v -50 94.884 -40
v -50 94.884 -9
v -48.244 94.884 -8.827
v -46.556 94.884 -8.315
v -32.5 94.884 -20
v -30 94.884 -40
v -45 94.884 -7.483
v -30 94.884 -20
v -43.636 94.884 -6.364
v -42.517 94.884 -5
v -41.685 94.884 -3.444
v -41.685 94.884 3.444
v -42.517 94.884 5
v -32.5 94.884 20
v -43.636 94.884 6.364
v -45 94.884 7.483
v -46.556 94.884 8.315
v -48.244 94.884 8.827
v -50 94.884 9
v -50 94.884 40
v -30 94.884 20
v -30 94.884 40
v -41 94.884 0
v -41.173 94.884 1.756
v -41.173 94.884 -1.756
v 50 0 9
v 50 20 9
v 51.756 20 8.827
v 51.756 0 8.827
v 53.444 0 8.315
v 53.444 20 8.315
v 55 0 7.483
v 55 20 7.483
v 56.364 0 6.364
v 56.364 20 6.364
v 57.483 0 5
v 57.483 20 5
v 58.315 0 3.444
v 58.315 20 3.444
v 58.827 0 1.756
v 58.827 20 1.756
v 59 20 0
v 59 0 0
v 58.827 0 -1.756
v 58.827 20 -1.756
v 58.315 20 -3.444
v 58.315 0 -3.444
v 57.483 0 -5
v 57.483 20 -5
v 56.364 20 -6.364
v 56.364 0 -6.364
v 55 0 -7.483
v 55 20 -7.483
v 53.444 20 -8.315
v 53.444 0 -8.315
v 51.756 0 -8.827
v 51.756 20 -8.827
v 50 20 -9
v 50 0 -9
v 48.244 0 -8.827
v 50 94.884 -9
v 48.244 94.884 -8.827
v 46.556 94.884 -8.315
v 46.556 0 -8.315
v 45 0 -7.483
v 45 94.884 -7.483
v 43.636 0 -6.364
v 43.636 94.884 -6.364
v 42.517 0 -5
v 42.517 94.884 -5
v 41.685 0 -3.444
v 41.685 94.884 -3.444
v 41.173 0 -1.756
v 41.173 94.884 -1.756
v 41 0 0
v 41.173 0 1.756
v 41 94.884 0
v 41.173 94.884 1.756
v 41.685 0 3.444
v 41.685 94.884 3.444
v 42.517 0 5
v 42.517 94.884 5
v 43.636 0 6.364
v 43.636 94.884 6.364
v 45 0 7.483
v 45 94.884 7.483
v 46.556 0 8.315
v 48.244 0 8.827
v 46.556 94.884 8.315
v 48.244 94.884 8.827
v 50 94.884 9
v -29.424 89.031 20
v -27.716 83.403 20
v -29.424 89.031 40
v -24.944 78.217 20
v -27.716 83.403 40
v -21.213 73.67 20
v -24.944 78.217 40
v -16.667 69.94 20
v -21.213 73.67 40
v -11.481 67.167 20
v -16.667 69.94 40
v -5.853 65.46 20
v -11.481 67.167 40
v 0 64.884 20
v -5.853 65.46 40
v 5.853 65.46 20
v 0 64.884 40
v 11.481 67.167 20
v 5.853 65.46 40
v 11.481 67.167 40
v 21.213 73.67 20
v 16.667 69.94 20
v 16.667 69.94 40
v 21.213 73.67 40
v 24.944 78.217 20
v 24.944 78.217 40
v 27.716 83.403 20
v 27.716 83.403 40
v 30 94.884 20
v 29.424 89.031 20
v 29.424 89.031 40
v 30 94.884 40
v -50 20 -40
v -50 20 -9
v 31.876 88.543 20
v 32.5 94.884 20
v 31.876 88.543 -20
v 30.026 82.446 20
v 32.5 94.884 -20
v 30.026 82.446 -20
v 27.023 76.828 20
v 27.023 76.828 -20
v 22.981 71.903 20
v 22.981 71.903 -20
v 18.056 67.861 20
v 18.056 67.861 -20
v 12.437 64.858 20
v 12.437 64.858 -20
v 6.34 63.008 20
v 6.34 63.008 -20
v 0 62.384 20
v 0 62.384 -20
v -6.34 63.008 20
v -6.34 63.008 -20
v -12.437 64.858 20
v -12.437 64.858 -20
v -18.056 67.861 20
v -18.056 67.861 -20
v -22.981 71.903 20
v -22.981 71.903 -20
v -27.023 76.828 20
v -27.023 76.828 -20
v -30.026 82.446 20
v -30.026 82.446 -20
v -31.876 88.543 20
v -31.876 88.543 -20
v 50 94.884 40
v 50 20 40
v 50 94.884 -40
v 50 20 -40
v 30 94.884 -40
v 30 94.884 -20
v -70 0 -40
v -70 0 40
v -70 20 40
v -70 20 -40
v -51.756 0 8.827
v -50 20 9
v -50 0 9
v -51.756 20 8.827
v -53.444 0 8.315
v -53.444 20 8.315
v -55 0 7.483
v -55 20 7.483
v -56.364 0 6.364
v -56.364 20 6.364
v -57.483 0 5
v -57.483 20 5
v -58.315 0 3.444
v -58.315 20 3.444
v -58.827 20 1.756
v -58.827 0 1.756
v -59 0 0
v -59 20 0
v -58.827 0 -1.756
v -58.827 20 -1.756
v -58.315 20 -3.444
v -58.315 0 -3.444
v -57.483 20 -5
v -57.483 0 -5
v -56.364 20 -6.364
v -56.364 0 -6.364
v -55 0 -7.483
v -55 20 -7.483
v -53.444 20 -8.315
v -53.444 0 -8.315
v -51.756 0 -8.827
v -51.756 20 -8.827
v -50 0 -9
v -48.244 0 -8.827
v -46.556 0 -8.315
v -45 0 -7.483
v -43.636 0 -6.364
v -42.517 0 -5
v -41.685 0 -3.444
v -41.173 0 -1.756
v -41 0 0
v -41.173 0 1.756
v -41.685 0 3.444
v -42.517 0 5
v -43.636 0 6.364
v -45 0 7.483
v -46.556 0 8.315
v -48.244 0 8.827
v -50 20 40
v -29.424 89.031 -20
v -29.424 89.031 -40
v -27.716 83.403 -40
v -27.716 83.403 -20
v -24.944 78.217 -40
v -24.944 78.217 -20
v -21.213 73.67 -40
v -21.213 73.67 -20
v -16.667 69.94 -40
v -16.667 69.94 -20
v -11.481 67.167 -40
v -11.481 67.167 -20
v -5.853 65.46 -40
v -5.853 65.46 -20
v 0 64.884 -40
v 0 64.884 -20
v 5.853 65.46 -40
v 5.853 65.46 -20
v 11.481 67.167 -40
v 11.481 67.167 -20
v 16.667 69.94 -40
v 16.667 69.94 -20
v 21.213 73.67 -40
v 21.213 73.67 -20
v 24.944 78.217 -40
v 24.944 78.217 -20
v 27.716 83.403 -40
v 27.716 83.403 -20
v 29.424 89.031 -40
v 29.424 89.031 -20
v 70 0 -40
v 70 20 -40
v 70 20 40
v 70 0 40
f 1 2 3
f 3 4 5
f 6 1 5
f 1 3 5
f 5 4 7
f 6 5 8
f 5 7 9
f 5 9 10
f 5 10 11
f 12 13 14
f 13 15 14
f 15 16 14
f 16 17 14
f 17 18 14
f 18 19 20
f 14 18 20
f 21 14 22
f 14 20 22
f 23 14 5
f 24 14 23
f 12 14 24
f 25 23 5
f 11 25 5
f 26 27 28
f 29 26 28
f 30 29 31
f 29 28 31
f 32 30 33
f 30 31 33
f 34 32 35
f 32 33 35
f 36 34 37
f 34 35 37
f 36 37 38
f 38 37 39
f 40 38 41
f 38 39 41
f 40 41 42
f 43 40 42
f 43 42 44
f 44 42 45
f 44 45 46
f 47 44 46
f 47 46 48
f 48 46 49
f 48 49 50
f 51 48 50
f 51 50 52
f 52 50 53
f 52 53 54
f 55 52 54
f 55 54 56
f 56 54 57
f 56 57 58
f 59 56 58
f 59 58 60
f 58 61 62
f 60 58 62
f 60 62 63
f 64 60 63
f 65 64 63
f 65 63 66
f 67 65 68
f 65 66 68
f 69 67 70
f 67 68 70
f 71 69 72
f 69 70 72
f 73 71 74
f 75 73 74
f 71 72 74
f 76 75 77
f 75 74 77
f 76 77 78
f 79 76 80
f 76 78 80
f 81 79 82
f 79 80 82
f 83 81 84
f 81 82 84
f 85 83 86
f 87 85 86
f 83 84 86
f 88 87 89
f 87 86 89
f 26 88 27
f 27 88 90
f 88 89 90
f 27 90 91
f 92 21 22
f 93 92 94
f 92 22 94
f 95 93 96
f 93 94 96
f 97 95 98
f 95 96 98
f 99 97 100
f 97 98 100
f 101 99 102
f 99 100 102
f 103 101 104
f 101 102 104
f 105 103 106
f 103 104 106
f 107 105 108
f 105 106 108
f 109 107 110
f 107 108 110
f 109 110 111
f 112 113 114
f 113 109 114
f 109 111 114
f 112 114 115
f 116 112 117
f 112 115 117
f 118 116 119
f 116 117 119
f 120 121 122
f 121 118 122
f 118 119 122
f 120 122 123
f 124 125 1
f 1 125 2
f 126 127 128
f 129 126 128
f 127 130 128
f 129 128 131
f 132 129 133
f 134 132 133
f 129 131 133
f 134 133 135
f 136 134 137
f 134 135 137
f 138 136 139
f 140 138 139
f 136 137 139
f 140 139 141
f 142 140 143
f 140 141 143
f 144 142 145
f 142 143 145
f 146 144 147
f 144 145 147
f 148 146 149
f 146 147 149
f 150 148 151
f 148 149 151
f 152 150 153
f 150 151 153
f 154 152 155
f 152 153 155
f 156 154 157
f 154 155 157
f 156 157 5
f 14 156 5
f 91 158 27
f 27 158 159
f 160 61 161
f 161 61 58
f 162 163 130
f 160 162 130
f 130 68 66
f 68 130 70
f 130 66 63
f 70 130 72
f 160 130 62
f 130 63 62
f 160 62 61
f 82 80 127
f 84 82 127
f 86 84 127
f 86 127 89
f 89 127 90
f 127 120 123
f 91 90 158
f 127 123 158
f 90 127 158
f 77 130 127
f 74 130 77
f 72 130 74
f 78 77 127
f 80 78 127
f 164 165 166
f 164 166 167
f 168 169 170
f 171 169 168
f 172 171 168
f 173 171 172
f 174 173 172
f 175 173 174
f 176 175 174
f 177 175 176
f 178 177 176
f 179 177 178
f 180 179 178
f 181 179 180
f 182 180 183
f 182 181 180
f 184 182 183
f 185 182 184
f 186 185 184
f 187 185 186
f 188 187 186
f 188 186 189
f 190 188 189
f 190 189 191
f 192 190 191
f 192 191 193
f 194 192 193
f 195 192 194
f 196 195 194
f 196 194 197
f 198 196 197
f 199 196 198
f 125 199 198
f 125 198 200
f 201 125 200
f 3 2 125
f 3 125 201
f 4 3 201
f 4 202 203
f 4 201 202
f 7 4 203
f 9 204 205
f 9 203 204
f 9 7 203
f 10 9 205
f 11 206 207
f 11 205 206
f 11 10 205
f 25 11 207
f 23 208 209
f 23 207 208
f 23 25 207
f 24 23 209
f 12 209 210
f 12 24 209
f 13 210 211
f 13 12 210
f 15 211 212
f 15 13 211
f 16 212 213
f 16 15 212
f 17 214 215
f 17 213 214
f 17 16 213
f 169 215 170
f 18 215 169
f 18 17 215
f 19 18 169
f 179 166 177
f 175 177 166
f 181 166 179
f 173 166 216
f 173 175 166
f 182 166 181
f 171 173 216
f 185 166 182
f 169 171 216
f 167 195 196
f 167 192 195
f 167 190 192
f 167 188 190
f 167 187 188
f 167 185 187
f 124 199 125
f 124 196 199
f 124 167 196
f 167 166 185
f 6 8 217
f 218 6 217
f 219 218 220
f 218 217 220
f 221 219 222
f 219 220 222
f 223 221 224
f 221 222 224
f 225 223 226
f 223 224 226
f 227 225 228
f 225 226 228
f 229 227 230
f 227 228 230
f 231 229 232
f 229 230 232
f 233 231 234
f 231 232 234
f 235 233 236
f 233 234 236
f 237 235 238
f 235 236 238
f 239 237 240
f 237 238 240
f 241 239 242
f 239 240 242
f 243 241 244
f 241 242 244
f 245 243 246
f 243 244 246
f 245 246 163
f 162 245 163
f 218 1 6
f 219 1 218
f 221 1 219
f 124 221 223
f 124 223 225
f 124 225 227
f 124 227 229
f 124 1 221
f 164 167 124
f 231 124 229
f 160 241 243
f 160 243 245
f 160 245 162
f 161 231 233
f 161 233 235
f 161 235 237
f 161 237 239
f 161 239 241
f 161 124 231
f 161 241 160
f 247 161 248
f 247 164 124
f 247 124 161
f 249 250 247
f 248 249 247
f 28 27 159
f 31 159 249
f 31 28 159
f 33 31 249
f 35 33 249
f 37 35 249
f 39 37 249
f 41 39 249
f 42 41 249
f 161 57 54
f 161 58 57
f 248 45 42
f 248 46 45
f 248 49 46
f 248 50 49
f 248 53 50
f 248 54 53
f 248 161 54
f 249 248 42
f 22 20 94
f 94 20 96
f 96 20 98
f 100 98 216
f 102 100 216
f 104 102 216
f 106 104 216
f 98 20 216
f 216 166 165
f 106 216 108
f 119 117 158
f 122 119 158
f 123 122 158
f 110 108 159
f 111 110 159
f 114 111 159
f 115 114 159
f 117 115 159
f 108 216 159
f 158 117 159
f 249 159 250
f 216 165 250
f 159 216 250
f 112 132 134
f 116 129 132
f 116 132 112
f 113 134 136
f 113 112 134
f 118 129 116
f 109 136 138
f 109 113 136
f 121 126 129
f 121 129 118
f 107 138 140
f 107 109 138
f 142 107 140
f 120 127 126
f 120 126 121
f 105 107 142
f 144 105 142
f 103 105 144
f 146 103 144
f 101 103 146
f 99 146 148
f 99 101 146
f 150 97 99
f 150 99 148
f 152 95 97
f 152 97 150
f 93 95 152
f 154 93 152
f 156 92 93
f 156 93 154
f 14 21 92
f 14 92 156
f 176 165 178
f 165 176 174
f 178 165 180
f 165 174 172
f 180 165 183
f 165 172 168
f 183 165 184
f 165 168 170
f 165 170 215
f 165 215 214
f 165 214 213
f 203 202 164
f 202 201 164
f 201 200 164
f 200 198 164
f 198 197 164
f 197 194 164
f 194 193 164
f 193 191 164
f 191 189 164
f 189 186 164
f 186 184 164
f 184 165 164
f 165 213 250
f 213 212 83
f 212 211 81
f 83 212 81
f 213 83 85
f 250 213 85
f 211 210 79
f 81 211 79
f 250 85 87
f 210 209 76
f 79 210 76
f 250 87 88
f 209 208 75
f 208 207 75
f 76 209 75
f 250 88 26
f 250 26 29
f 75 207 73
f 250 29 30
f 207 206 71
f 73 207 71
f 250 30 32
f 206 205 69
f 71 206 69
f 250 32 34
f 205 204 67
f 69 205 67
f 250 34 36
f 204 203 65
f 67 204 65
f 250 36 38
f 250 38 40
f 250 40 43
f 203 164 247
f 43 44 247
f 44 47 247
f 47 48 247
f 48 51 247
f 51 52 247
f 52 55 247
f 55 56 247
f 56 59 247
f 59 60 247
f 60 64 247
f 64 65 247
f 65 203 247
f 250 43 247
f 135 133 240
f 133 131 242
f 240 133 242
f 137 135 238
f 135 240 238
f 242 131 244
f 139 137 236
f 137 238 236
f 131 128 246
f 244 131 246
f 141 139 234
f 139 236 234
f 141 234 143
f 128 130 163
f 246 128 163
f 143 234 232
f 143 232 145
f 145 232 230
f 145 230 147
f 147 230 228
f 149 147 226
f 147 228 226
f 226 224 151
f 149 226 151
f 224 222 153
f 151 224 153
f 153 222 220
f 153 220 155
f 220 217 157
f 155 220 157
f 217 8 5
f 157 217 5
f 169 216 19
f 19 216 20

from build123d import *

# Parameters (mm, degrees)
SKETCH1_W           = 140
SKETCH1_H           = 80
BOSS_EXTRUDE1_DEPTH = 20
BOSS_EXTRUDE2_DEPTH = 80
SKETCH3_W           = 2.5
SKETCH3_H           = 40
SKETCH4_R           = 9
CUT_EXTRUDE1_DEPTH  = 125.510684884


with BuildPart() as part:
    # Sketch1 → Boss-Extrude1 (new body)
    with BuildSketch(Plane(origin=(0, 0, 0), x_dir=(1, 0, 0), z_dir=(0, 1, 0))):
        Rectangle(SKETCH1_W, SKETCH1_H)
    extrude(amount=BOSS_EXTRUDE1_DEPTH)

    # Sketch2 → Boss-Extrude2 (add, through all)
    with BuildSketch(Plane.XY.offset(40)):
        with BuildLine():
            Line((30, 94.883669039), (50, 94.883669039))
            Line((50, 94.883669039), (50, 20))
            Line((50, 20), (-50, 20))
            Line((-50, 20), (-50, 94.883669039))
            Line((-50, 94.883669039), (-30, 94.883669039))
            ThreePointArc((-30, 94.883669039), (0, 64.883669039), (30, 94.883669039))
        make_face()
    extrude(amount=-BOSS_EXTRUDE2_DEPTH)

    # Sketch3 → Cut-Revolve1 (revolve, cut)
    with BuildSketch(Plane(origin=(0, 94.883669039, 0), x_dir=(1, 0, 0), z_dir=(0, 1, 0))):
        with Locations((-31.25, 0)):
            Rectangle(SKETCH3_W, SKETCH3_H)
    revolve(axis=Axis((0, 94.883669039, 29.575987761), (0, 0, -1)), mode=Mode.SUBTRACT)

    # Sketch4 → Cut-Extrude1 (cut, through all)
    with BuildSketch(Plane(origin=(0, 94.883669039, 0), x_dir=(1, 0, 0), z_dir=(0, 1, 0))):
        with Locations(Location((50, 0, 0), (0, 0, 270))):
            Circle(SKETCH4_R)
    cut_extrude1 = extrude(amount=-CUT_EXTRUDE1_DEPTH, mode=Mode.SUBTRACT)

    # Mirror1: Cut-Extrude1 across plane
    add(cut_extrude1.mirror(Plane(origin=(0, 0, 0), x_dir=(0, 0, 1), z_dir=(1, 0, 0))), mode=Mode.SUBTRACT)


solid = part.part
